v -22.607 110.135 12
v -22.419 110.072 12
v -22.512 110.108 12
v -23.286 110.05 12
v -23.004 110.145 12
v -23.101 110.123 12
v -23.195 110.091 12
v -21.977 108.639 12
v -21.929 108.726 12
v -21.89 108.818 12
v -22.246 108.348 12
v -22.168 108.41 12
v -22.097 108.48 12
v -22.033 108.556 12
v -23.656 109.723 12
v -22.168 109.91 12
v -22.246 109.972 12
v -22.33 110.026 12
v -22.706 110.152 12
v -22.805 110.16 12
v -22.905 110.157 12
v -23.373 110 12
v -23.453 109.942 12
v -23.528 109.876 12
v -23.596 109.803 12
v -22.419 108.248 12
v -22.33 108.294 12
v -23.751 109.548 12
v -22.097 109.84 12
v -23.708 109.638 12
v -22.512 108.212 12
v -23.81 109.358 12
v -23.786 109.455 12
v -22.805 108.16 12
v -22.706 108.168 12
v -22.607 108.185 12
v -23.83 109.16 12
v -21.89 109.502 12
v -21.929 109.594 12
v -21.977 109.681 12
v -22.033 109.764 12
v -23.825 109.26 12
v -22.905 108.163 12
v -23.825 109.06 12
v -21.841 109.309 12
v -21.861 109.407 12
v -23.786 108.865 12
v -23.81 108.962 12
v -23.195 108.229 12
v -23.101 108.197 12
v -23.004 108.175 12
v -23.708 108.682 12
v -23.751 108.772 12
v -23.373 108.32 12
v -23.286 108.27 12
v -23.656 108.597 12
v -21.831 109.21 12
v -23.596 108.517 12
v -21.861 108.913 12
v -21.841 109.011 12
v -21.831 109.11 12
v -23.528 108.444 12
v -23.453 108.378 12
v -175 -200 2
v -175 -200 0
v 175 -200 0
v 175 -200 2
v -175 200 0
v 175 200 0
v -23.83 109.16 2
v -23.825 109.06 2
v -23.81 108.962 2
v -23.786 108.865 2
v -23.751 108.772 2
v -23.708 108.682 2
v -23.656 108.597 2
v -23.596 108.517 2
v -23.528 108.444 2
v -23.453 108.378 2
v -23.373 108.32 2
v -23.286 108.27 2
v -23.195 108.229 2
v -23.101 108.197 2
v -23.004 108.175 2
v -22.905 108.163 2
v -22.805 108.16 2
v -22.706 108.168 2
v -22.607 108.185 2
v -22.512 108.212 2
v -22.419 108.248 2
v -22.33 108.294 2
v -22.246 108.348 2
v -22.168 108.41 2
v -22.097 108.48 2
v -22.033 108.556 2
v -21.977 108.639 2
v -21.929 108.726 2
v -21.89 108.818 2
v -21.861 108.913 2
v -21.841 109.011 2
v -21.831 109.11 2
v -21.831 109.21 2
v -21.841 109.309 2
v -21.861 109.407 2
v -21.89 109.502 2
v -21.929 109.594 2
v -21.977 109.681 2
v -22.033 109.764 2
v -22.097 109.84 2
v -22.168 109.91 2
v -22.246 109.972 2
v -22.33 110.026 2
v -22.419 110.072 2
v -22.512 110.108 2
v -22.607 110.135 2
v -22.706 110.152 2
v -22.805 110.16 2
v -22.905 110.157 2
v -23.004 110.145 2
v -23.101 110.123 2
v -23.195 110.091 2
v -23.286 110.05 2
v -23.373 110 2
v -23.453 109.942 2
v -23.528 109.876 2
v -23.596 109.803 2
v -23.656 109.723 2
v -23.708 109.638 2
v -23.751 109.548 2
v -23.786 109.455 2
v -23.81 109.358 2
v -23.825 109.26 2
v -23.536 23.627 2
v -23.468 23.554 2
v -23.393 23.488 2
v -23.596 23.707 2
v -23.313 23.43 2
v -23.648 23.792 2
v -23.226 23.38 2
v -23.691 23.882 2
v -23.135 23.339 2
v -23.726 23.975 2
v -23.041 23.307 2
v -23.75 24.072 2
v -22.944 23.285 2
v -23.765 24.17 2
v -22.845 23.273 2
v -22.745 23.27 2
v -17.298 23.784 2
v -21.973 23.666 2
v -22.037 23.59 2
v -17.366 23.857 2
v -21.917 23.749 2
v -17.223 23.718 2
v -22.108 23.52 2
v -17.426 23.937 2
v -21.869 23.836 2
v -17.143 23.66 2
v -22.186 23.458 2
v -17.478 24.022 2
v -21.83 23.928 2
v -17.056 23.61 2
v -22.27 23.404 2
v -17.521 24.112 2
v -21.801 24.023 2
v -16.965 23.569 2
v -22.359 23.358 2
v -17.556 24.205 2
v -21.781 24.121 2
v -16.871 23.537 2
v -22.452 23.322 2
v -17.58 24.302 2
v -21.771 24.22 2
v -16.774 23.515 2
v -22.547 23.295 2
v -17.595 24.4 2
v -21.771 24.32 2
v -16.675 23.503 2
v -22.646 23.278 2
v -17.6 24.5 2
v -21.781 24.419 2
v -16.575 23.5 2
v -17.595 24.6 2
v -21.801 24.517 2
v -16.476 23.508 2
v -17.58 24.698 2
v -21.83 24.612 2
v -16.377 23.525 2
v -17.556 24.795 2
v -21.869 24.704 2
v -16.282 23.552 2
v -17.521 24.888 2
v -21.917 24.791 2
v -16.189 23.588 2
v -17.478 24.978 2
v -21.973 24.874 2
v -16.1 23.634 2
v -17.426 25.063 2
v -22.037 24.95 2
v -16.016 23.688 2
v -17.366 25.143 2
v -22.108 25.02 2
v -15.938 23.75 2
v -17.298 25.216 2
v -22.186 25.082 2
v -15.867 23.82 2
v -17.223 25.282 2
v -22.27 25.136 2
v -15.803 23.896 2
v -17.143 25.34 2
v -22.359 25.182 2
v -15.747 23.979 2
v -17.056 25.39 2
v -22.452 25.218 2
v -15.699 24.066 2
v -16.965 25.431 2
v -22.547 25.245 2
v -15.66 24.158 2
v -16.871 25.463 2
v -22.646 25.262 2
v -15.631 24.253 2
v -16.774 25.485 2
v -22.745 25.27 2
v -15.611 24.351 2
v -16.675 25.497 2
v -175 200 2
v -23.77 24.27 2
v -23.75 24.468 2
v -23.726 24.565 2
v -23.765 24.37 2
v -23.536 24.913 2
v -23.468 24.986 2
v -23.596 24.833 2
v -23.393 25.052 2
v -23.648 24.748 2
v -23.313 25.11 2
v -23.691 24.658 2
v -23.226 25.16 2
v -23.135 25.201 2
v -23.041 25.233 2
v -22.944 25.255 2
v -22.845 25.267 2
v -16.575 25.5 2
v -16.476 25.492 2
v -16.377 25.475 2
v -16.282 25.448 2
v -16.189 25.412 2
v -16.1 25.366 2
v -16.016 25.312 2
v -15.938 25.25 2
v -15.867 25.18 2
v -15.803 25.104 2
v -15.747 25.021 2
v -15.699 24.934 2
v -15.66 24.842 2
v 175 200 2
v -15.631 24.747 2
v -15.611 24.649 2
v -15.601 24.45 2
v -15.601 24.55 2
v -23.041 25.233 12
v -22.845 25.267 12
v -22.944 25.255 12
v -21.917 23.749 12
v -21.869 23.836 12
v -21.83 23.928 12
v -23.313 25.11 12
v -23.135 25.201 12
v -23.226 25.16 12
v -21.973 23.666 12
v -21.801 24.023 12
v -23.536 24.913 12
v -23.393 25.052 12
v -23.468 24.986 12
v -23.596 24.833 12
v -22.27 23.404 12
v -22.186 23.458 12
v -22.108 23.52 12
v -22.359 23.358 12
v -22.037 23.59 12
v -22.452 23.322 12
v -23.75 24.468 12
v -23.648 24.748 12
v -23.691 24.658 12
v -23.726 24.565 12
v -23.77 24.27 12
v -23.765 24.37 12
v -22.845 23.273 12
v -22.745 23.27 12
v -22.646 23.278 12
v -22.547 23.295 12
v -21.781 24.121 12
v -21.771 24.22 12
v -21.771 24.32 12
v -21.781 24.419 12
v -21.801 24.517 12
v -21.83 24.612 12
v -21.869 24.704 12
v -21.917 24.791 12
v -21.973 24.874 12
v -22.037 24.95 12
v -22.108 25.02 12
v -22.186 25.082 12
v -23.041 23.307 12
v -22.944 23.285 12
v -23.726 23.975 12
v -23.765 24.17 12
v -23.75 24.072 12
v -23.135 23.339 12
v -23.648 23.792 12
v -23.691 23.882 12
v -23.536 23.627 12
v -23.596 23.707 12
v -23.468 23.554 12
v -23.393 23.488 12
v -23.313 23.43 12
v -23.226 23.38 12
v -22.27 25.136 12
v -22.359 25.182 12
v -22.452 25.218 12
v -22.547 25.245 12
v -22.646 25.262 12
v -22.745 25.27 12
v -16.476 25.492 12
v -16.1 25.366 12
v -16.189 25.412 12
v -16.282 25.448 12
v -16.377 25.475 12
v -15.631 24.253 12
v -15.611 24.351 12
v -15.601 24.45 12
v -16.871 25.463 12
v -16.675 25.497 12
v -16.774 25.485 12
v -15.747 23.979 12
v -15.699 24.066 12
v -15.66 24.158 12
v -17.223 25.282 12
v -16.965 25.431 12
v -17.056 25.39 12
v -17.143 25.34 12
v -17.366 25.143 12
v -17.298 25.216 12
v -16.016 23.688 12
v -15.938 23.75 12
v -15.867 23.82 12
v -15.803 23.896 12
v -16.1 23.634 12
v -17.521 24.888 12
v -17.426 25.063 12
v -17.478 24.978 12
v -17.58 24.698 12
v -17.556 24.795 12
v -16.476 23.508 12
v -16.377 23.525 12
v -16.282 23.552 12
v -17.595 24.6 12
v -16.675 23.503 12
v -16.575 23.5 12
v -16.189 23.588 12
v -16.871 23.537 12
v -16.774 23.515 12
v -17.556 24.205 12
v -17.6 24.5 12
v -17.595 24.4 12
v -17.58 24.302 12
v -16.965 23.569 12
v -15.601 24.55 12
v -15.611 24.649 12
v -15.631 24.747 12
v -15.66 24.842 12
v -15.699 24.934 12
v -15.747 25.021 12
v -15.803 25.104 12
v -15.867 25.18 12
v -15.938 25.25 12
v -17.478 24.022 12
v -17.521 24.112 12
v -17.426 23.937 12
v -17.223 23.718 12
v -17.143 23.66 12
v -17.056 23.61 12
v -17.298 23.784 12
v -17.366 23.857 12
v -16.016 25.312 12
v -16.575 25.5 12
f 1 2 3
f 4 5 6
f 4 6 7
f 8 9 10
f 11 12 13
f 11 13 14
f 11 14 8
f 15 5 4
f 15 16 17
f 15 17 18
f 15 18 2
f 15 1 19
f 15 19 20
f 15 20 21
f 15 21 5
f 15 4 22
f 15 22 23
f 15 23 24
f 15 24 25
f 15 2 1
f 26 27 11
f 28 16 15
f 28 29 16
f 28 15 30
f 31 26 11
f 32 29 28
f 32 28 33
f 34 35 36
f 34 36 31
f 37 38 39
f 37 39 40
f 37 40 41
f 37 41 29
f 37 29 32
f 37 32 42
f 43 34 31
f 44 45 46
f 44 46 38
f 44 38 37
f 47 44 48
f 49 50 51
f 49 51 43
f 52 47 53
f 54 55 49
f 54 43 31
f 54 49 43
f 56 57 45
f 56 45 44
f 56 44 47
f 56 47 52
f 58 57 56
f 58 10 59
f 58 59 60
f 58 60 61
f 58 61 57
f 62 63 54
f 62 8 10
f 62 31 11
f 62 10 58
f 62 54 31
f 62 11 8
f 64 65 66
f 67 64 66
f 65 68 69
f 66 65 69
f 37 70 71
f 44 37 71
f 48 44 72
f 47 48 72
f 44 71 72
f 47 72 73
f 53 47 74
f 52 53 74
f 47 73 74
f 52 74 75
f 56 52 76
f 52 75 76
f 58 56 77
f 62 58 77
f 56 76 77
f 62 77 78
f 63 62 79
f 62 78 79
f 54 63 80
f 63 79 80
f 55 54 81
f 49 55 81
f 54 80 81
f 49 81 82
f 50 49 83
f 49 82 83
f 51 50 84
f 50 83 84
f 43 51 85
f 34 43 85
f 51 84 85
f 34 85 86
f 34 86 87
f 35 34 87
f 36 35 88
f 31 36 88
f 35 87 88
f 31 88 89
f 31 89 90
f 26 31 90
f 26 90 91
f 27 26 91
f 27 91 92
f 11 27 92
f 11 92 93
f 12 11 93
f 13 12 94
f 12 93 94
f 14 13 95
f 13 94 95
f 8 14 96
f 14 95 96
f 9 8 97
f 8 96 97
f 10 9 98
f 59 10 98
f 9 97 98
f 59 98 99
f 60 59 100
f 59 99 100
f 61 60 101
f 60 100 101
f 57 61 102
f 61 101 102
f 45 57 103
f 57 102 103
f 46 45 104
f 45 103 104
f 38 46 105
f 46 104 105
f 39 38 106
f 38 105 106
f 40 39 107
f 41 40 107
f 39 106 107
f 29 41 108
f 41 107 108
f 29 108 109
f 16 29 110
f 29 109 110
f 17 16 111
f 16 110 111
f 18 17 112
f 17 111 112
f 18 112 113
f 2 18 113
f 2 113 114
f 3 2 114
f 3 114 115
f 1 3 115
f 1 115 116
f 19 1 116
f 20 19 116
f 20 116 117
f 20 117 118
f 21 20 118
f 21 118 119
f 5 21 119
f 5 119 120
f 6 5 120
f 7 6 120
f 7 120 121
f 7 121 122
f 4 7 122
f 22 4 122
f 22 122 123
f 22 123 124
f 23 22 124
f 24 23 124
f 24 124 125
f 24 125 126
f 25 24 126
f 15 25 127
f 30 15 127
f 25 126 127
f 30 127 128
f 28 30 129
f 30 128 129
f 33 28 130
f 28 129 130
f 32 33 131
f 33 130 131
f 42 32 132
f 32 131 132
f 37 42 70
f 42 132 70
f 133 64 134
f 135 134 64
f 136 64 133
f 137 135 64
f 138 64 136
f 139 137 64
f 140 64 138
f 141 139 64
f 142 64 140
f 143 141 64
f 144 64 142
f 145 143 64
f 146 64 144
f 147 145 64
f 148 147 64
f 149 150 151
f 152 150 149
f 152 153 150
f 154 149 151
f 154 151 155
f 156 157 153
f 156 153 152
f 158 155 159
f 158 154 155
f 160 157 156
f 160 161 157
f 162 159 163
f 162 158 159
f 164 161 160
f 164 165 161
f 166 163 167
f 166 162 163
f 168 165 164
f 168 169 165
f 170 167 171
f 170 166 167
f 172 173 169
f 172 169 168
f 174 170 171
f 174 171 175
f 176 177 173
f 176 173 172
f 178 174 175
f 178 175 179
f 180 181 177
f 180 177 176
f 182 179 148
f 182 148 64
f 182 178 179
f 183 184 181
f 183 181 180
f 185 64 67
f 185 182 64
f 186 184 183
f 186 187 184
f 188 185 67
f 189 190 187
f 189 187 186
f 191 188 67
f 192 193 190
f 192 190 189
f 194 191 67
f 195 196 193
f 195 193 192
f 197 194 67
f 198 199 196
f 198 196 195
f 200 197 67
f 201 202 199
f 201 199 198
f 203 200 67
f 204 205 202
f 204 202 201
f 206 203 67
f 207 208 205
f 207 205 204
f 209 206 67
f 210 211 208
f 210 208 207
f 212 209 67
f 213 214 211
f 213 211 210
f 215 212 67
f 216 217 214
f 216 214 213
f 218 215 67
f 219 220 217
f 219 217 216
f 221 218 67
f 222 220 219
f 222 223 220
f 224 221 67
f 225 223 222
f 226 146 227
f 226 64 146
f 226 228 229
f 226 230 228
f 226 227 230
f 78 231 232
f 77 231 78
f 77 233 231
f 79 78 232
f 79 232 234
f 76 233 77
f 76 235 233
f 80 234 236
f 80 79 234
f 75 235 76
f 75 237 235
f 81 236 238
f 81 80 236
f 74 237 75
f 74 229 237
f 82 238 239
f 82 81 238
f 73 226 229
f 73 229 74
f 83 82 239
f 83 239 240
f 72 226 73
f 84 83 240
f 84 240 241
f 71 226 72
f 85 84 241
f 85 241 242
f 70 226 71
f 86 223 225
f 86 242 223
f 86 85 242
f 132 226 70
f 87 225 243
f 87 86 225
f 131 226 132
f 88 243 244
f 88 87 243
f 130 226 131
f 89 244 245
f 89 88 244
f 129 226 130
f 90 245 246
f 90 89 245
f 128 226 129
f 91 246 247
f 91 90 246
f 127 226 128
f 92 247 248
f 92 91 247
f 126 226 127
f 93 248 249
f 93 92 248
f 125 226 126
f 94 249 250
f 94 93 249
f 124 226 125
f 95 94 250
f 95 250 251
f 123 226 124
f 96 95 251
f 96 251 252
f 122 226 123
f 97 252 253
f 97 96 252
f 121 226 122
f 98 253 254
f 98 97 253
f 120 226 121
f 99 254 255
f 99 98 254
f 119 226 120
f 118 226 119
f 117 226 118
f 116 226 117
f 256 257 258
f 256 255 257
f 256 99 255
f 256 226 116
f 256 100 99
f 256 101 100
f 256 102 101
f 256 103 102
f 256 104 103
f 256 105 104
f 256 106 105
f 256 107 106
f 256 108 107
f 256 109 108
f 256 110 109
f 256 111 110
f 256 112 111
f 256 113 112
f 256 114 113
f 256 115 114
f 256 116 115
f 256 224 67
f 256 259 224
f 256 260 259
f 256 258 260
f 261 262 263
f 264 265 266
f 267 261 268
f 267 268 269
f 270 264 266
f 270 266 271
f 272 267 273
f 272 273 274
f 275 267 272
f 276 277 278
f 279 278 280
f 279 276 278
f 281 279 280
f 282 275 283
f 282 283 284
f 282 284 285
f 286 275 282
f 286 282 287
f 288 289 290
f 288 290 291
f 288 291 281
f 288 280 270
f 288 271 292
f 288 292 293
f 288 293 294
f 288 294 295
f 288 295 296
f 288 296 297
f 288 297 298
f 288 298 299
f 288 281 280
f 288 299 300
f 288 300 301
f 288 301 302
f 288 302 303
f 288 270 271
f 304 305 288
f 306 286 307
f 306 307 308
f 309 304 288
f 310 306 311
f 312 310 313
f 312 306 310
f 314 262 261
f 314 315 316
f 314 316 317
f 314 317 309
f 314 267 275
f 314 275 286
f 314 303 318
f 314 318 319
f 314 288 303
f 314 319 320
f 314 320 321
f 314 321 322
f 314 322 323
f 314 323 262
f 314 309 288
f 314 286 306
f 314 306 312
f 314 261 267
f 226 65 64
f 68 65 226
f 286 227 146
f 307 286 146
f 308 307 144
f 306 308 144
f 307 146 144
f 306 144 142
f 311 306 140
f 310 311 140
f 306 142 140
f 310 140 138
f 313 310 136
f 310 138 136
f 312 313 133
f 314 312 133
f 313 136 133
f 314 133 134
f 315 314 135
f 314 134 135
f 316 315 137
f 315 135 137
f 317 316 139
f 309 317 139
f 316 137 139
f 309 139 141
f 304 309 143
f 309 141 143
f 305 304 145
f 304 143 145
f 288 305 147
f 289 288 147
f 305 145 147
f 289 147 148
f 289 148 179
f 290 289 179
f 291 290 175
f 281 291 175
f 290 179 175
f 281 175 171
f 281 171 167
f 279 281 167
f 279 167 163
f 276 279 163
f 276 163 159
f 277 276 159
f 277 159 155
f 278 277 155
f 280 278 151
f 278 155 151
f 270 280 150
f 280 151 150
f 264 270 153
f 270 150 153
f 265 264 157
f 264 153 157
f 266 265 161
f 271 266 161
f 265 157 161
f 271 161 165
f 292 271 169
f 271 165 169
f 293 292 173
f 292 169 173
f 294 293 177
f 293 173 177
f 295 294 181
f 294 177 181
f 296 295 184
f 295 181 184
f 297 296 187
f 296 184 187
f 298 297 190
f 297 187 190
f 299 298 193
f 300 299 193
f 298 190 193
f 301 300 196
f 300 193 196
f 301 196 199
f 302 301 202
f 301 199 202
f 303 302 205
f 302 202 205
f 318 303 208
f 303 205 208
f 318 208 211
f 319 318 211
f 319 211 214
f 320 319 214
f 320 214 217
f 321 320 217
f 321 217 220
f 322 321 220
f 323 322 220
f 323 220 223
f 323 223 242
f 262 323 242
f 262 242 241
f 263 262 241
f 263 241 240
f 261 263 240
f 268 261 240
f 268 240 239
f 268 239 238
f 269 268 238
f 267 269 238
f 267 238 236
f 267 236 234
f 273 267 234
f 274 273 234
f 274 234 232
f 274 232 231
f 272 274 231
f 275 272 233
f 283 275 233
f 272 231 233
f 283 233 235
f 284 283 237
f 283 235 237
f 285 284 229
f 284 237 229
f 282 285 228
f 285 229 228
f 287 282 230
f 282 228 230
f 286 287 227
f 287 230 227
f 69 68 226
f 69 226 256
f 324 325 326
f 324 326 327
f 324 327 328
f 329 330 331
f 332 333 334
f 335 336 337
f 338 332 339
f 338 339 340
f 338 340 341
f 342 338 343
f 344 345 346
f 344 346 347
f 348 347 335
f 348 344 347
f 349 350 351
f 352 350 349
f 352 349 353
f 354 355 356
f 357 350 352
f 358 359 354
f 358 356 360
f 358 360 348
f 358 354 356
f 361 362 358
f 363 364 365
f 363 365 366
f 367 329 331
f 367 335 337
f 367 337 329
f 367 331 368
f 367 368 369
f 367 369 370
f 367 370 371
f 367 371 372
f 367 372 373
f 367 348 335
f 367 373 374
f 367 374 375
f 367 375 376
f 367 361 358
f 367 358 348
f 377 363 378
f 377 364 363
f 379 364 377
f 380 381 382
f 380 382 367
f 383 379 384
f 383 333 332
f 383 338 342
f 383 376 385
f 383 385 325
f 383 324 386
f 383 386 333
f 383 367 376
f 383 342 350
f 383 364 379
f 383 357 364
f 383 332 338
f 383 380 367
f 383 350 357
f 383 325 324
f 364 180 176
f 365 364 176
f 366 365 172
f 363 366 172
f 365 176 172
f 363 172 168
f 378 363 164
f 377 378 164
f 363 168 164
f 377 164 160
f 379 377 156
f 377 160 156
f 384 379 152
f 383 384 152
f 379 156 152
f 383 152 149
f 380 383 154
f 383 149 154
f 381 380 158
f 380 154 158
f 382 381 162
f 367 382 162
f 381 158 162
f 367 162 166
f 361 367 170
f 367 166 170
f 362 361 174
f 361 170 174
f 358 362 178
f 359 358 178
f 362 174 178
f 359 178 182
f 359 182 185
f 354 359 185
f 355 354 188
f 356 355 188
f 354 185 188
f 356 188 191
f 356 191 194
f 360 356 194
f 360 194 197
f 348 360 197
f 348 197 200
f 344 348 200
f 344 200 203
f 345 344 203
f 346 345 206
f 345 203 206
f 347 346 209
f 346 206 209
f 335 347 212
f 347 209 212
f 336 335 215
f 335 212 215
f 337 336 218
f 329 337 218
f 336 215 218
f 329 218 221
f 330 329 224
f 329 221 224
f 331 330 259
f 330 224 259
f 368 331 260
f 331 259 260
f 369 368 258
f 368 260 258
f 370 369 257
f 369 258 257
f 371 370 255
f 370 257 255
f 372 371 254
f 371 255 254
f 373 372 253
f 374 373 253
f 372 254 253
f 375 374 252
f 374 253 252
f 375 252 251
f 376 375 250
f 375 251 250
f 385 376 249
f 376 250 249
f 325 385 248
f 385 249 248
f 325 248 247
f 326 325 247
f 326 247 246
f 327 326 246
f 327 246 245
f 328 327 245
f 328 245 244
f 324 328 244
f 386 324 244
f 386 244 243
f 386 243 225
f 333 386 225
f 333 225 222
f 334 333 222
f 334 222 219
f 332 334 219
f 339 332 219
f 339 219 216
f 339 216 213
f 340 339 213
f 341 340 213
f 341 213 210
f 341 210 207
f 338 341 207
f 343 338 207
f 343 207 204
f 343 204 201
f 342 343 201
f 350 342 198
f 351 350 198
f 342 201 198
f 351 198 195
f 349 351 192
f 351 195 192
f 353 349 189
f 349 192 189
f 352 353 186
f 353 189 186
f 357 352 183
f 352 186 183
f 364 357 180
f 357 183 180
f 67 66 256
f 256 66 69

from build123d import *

# Parameters (mm, degrees)
ESBO_O1_W                = 350
ESBO_O1_H                = 400
RESSALTO_EXTRUS_O1_DEPTH = 2
ESBO_O2_R                = 1
RESSALTO_EXTRUS_O2_DEPTH = 10


with BuildPart() as part:
    # Esboço1 → Ressalto-extrusão1 (new body)
    with BuildSketch(Plane.XY):
        Rectangle(ESBO_O1_W, ESBO_O1_H)
    extrude(amount=RESSALTO_EXTRUS_O1_DEPTH)

    # Esboço2 → Ressalto-extrusão2 (add)
    with BuildSketch(Plane.XY.offset(2)):
        with Locations(Location((-16.6, 24.5, 0), (0, 0, 180))):
            Circle(ESBO_O2_R)
        with Locations(Location((-22.77, 24.27, 0), (0, 0, 180))):
            Circle(ESBO_O2_R)
        with Locations(Location((-22.83, 109.16, 0), (0, 0, 180))):
            Circle(ESBO_O2_R)
    extrude(amount=RESSALTO_EXTRUS_O2_DEPTH)


solid = part.part
